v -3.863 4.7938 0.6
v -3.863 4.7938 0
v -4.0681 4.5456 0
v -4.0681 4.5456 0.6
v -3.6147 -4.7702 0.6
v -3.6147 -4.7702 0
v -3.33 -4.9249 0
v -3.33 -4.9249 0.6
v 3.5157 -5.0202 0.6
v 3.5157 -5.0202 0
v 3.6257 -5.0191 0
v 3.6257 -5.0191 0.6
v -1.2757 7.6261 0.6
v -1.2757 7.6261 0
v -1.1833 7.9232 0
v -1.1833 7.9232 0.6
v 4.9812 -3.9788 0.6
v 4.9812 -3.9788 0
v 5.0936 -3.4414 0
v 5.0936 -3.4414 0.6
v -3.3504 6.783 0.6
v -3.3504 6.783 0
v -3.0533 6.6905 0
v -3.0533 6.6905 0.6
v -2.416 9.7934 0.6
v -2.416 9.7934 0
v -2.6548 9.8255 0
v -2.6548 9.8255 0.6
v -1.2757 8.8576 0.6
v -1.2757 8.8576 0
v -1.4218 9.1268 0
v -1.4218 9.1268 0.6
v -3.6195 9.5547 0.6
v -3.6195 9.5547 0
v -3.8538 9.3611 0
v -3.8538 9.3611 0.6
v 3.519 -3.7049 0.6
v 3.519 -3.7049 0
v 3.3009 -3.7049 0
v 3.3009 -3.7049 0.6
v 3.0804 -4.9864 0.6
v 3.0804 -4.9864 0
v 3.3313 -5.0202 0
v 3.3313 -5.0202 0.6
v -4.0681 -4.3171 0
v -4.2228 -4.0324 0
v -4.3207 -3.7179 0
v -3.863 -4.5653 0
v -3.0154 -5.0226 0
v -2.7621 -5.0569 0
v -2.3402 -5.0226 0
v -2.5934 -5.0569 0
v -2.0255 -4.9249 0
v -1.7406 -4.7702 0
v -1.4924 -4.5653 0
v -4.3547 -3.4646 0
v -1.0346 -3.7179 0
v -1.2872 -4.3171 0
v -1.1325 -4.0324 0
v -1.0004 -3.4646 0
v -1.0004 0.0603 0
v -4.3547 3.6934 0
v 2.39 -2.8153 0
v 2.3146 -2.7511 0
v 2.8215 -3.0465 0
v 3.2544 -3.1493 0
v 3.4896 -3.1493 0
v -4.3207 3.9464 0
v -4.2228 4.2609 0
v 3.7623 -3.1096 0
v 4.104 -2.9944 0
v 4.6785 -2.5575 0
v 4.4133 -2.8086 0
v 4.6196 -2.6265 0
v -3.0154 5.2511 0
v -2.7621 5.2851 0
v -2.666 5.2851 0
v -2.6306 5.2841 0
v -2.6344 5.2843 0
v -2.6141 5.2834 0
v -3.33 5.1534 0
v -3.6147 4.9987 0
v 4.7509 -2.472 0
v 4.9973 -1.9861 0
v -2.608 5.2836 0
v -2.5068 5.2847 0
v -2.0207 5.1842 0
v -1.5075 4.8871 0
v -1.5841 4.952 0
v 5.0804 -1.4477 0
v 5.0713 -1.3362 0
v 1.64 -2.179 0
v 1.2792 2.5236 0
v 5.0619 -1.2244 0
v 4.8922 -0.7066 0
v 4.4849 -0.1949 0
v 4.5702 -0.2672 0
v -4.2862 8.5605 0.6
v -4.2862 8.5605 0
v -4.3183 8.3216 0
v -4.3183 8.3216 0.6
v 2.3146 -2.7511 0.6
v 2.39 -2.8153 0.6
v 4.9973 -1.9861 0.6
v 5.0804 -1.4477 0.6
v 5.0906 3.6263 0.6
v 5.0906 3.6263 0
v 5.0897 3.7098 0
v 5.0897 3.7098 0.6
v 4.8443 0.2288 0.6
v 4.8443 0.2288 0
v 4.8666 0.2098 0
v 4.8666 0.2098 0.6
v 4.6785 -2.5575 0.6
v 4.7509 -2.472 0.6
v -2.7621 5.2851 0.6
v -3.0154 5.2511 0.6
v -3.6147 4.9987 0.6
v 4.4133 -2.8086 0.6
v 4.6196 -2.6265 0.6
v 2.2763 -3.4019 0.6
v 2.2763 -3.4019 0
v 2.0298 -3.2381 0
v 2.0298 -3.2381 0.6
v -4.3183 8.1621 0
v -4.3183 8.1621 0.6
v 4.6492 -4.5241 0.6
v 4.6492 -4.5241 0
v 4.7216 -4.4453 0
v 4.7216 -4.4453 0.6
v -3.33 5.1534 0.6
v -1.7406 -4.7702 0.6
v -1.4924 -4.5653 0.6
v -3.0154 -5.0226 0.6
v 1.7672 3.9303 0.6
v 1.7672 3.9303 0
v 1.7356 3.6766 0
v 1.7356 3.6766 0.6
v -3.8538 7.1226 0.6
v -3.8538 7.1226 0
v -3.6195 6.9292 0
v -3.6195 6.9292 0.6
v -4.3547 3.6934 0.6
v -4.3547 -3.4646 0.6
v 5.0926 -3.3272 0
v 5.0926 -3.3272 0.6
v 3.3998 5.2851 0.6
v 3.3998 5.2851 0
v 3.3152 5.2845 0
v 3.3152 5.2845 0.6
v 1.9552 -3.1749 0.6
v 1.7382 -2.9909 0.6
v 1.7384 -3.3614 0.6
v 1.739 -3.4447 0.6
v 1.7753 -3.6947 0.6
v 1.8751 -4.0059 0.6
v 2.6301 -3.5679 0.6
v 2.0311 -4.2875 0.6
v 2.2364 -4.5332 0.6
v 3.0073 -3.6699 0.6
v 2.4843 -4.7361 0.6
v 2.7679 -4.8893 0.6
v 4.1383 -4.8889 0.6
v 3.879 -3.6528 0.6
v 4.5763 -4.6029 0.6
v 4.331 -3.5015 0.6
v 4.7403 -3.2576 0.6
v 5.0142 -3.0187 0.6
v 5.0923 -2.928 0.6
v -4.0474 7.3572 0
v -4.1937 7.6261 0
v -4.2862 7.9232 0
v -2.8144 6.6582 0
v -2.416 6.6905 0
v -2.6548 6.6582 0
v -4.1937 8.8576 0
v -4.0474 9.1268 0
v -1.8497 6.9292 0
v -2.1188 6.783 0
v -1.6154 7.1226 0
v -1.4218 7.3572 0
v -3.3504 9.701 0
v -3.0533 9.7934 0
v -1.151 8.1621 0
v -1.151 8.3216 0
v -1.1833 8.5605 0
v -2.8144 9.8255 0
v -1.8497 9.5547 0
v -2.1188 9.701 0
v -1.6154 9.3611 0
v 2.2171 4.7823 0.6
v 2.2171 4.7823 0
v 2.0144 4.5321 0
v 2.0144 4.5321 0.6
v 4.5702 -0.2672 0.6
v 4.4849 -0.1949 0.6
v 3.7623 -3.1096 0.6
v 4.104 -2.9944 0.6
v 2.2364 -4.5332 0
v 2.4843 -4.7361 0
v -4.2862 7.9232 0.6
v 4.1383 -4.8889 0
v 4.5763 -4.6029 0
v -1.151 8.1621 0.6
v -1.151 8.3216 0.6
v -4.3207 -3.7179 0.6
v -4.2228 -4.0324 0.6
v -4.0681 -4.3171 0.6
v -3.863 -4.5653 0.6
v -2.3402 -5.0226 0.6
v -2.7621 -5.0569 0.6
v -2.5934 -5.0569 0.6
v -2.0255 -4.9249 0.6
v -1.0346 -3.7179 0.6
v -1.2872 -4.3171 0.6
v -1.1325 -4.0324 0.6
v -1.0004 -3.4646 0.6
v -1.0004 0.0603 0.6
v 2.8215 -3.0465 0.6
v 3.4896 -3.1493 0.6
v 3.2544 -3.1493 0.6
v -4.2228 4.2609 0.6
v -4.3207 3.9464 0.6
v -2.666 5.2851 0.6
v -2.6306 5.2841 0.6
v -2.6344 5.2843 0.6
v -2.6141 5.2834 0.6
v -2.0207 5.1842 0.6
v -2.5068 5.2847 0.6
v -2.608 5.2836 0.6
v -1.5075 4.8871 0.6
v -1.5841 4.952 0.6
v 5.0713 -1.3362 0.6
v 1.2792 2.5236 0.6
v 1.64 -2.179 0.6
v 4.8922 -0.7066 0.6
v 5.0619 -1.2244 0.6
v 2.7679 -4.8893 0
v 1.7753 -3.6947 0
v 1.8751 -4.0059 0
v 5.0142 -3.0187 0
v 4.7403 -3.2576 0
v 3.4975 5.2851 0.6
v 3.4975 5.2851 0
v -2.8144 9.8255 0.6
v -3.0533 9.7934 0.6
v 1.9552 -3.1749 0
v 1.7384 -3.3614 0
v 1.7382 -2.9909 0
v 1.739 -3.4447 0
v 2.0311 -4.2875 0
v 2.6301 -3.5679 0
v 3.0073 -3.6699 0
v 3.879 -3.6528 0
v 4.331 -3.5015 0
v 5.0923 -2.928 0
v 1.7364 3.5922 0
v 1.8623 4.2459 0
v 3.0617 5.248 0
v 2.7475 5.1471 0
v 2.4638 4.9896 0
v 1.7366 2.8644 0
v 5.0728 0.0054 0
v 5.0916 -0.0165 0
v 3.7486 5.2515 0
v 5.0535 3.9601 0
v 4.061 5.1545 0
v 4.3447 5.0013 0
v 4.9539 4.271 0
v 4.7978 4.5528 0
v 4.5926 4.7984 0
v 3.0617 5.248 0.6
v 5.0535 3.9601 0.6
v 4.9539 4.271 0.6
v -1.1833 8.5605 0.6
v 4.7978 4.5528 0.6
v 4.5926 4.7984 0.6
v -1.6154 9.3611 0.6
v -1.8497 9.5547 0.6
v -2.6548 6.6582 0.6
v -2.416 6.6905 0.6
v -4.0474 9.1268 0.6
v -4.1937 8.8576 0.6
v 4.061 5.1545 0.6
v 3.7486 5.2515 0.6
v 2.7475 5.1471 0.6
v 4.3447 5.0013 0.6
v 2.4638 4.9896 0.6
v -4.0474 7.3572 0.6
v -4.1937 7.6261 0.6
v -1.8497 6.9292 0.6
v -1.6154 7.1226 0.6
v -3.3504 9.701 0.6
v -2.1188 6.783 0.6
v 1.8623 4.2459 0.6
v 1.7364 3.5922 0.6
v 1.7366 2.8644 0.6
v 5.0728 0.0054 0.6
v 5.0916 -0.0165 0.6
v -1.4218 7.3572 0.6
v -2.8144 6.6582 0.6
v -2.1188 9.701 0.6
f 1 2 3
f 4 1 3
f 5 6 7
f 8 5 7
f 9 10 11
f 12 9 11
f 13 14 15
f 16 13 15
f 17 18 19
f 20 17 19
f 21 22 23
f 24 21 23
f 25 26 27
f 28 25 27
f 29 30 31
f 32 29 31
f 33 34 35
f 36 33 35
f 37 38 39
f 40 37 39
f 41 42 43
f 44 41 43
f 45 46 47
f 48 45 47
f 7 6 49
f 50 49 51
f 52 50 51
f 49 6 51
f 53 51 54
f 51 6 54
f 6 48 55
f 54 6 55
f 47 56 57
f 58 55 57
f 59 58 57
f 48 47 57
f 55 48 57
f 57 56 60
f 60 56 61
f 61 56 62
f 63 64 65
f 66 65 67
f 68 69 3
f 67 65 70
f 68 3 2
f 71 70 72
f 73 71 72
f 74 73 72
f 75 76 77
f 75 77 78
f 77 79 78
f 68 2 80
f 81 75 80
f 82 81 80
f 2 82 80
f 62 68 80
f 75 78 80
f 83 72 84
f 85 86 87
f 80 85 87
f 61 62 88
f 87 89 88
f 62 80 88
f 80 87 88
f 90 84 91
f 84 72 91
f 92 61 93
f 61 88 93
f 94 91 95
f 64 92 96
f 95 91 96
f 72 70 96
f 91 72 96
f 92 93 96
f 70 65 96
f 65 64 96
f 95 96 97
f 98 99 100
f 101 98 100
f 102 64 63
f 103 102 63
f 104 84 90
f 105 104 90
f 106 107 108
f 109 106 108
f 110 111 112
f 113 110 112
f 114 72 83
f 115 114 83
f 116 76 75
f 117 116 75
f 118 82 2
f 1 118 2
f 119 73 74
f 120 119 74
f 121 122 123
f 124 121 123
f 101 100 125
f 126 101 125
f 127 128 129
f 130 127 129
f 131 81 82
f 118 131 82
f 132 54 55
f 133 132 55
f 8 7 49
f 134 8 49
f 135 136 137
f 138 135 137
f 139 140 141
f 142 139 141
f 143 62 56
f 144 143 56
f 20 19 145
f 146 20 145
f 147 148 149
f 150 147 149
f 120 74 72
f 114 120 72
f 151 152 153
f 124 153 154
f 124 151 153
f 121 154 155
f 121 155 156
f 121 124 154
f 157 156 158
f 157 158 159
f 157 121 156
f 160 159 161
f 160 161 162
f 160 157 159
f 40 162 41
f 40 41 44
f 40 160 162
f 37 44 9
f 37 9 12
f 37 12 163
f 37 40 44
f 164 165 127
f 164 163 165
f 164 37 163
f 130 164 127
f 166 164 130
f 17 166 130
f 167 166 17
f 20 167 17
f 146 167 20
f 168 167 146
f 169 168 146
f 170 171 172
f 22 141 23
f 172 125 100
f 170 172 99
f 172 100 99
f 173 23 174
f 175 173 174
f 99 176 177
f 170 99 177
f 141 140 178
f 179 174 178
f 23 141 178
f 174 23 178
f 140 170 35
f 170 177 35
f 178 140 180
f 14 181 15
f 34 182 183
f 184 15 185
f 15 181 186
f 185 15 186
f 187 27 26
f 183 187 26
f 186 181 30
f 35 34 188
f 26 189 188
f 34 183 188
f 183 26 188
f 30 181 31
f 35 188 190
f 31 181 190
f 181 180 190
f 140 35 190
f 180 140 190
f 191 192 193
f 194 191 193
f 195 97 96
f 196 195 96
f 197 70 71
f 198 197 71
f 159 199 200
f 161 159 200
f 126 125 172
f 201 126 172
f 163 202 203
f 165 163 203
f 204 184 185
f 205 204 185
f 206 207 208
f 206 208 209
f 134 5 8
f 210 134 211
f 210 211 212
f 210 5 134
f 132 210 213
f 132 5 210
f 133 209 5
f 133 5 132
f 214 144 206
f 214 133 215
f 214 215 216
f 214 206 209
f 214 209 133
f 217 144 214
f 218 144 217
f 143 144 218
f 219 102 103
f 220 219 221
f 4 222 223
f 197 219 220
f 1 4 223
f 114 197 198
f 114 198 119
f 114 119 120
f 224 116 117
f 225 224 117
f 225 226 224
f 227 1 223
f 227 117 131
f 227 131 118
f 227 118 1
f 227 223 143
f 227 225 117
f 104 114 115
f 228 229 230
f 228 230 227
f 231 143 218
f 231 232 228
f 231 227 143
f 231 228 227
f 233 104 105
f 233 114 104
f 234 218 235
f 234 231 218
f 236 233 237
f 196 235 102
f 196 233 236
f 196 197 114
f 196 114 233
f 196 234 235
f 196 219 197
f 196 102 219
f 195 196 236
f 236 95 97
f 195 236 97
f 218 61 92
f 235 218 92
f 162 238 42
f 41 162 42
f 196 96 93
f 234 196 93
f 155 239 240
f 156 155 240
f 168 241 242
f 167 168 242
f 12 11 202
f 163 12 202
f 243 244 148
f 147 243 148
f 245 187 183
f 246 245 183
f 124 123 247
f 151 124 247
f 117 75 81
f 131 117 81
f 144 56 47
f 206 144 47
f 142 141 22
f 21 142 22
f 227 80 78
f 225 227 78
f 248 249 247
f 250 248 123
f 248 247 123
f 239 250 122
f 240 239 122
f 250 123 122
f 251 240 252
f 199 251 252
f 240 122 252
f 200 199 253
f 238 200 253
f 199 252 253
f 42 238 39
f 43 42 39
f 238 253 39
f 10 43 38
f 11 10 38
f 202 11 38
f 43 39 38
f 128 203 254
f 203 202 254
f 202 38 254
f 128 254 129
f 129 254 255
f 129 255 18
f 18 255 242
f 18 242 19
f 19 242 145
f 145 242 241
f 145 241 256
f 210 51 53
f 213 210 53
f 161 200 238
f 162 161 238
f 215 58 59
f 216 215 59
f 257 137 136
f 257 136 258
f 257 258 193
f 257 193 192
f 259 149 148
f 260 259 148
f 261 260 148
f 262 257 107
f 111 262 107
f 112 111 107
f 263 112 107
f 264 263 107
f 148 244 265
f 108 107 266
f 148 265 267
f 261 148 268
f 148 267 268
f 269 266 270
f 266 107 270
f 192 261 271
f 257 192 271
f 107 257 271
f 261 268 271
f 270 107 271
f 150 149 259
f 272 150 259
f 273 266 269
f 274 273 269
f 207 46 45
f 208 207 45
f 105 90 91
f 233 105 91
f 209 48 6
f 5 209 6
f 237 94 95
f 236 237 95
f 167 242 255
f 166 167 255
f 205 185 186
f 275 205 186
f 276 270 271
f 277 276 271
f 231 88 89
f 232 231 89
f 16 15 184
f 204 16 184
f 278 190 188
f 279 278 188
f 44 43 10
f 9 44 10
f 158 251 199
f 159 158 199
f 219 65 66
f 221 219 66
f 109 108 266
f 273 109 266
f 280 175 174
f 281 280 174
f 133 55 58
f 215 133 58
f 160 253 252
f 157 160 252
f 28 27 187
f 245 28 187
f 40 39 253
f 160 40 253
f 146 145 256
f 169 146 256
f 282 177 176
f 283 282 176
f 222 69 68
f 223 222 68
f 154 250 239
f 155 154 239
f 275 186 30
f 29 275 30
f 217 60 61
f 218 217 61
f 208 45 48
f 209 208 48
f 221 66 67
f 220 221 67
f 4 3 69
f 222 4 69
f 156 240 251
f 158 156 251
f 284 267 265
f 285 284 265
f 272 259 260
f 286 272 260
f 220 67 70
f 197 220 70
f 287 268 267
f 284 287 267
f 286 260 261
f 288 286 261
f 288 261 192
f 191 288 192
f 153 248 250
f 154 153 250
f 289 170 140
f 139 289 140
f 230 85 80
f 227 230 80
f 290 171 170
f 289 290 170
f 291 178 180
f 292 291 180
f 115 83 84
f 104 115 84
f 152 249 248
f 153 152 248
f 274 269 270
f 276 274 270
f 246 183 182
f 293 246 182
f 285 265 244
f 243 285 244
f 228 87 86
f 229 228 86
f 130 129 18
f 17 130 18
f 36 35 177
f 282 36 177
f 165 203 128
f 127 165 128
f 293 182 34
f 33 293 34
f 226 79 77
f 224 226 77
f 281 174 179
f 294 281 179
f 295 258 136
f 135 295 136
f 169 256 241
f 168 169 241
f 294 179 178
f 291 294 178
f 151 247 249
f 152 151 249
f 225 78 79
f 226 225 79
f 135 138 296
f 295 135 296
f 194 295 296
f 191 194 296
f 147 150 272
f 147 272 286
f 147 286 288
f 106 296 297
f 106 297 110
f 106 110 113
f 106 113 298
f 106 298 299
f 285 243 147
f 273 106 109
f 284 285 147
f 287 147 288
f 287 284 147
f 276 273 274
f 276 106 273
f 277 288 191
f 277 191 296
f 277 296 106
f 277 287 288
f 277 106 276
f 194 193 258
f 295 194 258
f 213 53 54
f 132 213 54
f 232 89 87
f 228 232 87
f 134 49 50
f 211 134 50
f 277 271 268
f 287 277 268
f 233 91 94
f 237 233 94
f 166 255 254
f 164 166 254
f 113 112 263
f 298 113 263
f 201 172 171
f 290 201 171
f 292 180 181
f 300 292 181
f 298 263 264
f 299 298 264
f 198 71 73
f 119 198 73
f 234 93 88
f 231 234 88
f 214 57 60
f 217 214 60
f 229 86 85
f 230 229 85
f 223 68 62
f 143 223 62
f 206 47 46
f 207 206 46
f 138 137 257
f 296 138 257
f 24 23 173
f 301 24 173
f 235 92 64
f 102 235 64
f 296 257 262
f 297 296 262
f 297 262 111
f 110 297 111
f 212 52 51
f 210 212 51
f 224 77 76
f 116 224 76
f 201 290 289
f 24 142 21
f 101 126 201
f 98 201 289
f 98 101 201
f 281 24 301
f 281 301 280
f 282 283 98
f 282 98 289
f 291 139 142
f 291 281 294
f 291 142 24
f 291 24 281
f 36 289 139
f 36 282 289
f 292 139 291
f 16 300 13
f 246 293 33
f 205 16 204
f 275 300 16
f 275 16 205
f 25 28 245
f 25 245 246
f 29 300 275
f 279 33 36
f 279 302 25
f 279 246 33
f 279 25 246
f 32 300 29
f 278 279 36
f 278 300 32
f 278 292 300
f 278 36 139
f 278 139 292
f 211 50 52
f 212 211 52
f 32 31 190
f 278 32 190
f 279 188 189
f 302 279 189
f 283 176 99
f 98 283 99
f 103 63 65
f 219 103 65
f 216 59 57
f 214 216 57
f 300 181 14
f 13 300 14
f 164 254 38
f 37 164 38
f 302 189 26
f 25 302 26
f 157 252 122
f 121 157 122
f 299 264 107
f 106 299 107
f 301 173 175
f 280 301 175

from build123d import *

# Parameters (mm, degrees)
F1_DEPTH = 0.15
F2_SCALE = 4


# Not quite as in the source:
# - ends of sketch curves that miss each other by under 0.0002 mm in the source are joined


with BuildPart() as f1:
    # F0 (on Top) → F1 (new body)
    with BuildSketch(Plane.XY):
        Polygon((-0.66371, 2.45638), (-0.68363, 2.45638), (-0.70359, 2.45638), (-0.76332, 2.44835), (-0.8376, 2.42524), (-0.90488, 2.38867), (-0.96346, 2.34027), (-1.01186, 2.28169), (-1.04843, 2.21441), (-1.07154, 2.14013), (-1.07957, 2.0804), (-1.07957, 2.06044), (-1.07957, 2.04052), (-1.07154, 1.9808), (-1.04843, 1.90652), (-1.01186, 1.8393), (-0.96346, 1.78065), (-0.90488, 1.73231), (-0.8376, 1.69574), (-0.76332, 1.67263), (-0.70359, 1.66455), (-0.68363, 1.66455), (-0.66371, 1.66455), (-0.60399, 1.67263), (-0.52971, 1.69574), (-0.46243, 1.73231), (-0.40384, 1.78065), (-0.35545, 1.8393), (-0.31893, 1.90652), (-0.29582, 1.9808), (-0.28774, 2.04052), (-0.28774, 2.06044), (-0.28774, 2.0804), (-0.29582, 2.14013), (-0.31893, 2.21441), (-0.35545, 2.28169), (-0.40384, 2.34027), (-0.46243, 2.38867), (-0.52971, 2.42524), (-0.60399, 2.44835), align=None)
    extrude(amount=F1_DEPTH)


with BuildPart() as f1b:
    # F0 (on Top) → F1, piece 2 (new body)
    with BuildSketch(Plane.XY):
        Polygon((-0.25009, -0.8451), (-0.25009, 0.01508), (0.41001, -0.54476), (0.57864, -0.68777), (0.59751, -0.70383), (0.70537, -0.76162), (0.81361, -0.78733), (0.84973, -0.78733), (0.87241, -0.78733), (0.94057, -0.7774), (1.02601, -0.74859), (1.10332, -0.70215), (1.15491, -0.65663), (1.16962, -0.63938), (1.18773, -0.61801), (1.24932, -0.49653), (1.2701, -0.36192), (1.26782, -0.33404), (1.26548, -0.3061), (1.22305, -0.17665), (1.14254, -0.06679), (1.12122, -0.04872), (0.31979, 0.63091), (-0.37688, 1.22178), (-0.39603, 1.23801), (-0.50518, 1.29606), (-0.62671, 1.32117), (-0.652, 1.32091), (-0.65352, 1.32085), (-0.65764, 1.32102), (-0.65861, 1.32108), (-0.66649, 1.32128), (-0.6694, 1.32128), (-0.69052, 1.32128), (-0.75384, 1.31277), (-0.8325, 1.28835), (-0.90368, 1.24967), (-0.96574, 1.19845), (-1.01702, 1.1364), (-1.0557, 1.06522), (-1.08017, 0.9866), (-1.08868, 0.92334), (-1.08868, 0.90223), (-1.08868, -0.8451), (-1.08868, -0.86616), (-1.08017, -0.92948), (-1.0557, -1.00809), (-1.01702, -1.07927), (-0.96574, -1.14133), (-0.90368, -1.19255), (-0.8325, -1.23123), (-0.75384, -1.25565), (-0.69052, -1.26422), (-0.6694, -1.26422), (-0.64836, -1.26422), (-0.58504, -1.25565), (-0.50638, -1.23123), (-0.43514, -1.19255), (-0.37309, -1.14133), (-0.32181, -1.07927), (-0.28313, -1.00809), (-0.25866, -0.92948), (-0.25009, -0.86616), align=None)
    extrude(amount=F1_DEPTH)


with BuildPart() as f1c:
    # F0 (on Top) → F1, piece 3 (new body)
    with BuildSketch(Plane.XY):
        Polygon((0.85348, 1.32128), (0.84996, 1.32128), (0.8288, 1.32112), (0.76543, 1.31201), (0.68687, 1.28678), (0.61596, 1.2474), (0.55428, 1.19558), (0.50361, 1.13302), (0.46557, 1.06147), (0.4418, 0.98258), (0.43389, 0.91916), (0.43411, 0.89806), (0.43416, 0.71609), (1.21107, 0.05719), (1.21665, 0.05246), (1.26819, 0.00135), (1.27291, -0.00413), (1.27265, 0.90658), (1.27243, 0.92746), (1.26337, 0.99002), (1.23847, 1.06776), (1.19946, 1.13819), (1.14814, 1.19959), (1.08618, 1.25033), (1.01526, 1.28863), (0.93714, 1.31288), (0.87437, 1.32128), align=None)
    extrude(amount=F1_DEPTH)


with BuildPart() as f1d:
    # F0 (on Top) → F1, piece 4 (new body)
    with BuildSketch(Plane.XY):
        Polygon((1.14407, -1.15072), (1.16229, -1.13102), (1.18041, -1.11133), (1.2453, -0.99469), (1.2734, -0.86035), (1.27314, -0.83181), (1.27308, -0.73199), (1.25355, -0.75467), (1.18508, -0.8144), (1.08276, -0.87538), (0.96975, -0.9132), (0.87975, -0.92622), (0.84973, -0.92622), (0.82522, -0.92622), (0.75182, -0.91748), (0.65753, -0.89198), (0.56908, -0.85048), (0.50746, -0.80952), (0.48879, -0.79373), (0.43454, -0.74773), (0.43459, -0.84034), (0.43476, -0.86117), (0.44382, -0.92367), (0.46878, -1.00147), (0.50778, -1.07188), (0.55911, -1.1333), (0.62107, -1.18403), (0.69197, -1.22233), (0.7701, -1.24659), (0.83282, -1.25505), (0.85376, -1.25505), (0.85673, -1.25505), (0.8658, -1.25505), (0.87562, -1.25505), (0.87893, -1.25505), (0.90643, -1.25477), (1.03458, -1.22223), align=None)
    extrude(amount=F1_DEPTH)


with BuildPart() as f1_1:
    # F2: moved
    add(f1.part.scale(F2_SCALE))


with BuildPart() as f1b_1:
    # F2: moved
    add(f1b.part.scale(F2_SCALE))


with BuildPart() as f1c_1:
    # F2: moved
    add(f1c.part.scale(F2_SCALE))


with BuildPart() as f1d_1:
    # F2: moved
    add(f1d.part.scale(F2_SCALE))


solid = Compound([f1_1.part, f1b_1.part, f1c_1.part, f1d_1.part])
